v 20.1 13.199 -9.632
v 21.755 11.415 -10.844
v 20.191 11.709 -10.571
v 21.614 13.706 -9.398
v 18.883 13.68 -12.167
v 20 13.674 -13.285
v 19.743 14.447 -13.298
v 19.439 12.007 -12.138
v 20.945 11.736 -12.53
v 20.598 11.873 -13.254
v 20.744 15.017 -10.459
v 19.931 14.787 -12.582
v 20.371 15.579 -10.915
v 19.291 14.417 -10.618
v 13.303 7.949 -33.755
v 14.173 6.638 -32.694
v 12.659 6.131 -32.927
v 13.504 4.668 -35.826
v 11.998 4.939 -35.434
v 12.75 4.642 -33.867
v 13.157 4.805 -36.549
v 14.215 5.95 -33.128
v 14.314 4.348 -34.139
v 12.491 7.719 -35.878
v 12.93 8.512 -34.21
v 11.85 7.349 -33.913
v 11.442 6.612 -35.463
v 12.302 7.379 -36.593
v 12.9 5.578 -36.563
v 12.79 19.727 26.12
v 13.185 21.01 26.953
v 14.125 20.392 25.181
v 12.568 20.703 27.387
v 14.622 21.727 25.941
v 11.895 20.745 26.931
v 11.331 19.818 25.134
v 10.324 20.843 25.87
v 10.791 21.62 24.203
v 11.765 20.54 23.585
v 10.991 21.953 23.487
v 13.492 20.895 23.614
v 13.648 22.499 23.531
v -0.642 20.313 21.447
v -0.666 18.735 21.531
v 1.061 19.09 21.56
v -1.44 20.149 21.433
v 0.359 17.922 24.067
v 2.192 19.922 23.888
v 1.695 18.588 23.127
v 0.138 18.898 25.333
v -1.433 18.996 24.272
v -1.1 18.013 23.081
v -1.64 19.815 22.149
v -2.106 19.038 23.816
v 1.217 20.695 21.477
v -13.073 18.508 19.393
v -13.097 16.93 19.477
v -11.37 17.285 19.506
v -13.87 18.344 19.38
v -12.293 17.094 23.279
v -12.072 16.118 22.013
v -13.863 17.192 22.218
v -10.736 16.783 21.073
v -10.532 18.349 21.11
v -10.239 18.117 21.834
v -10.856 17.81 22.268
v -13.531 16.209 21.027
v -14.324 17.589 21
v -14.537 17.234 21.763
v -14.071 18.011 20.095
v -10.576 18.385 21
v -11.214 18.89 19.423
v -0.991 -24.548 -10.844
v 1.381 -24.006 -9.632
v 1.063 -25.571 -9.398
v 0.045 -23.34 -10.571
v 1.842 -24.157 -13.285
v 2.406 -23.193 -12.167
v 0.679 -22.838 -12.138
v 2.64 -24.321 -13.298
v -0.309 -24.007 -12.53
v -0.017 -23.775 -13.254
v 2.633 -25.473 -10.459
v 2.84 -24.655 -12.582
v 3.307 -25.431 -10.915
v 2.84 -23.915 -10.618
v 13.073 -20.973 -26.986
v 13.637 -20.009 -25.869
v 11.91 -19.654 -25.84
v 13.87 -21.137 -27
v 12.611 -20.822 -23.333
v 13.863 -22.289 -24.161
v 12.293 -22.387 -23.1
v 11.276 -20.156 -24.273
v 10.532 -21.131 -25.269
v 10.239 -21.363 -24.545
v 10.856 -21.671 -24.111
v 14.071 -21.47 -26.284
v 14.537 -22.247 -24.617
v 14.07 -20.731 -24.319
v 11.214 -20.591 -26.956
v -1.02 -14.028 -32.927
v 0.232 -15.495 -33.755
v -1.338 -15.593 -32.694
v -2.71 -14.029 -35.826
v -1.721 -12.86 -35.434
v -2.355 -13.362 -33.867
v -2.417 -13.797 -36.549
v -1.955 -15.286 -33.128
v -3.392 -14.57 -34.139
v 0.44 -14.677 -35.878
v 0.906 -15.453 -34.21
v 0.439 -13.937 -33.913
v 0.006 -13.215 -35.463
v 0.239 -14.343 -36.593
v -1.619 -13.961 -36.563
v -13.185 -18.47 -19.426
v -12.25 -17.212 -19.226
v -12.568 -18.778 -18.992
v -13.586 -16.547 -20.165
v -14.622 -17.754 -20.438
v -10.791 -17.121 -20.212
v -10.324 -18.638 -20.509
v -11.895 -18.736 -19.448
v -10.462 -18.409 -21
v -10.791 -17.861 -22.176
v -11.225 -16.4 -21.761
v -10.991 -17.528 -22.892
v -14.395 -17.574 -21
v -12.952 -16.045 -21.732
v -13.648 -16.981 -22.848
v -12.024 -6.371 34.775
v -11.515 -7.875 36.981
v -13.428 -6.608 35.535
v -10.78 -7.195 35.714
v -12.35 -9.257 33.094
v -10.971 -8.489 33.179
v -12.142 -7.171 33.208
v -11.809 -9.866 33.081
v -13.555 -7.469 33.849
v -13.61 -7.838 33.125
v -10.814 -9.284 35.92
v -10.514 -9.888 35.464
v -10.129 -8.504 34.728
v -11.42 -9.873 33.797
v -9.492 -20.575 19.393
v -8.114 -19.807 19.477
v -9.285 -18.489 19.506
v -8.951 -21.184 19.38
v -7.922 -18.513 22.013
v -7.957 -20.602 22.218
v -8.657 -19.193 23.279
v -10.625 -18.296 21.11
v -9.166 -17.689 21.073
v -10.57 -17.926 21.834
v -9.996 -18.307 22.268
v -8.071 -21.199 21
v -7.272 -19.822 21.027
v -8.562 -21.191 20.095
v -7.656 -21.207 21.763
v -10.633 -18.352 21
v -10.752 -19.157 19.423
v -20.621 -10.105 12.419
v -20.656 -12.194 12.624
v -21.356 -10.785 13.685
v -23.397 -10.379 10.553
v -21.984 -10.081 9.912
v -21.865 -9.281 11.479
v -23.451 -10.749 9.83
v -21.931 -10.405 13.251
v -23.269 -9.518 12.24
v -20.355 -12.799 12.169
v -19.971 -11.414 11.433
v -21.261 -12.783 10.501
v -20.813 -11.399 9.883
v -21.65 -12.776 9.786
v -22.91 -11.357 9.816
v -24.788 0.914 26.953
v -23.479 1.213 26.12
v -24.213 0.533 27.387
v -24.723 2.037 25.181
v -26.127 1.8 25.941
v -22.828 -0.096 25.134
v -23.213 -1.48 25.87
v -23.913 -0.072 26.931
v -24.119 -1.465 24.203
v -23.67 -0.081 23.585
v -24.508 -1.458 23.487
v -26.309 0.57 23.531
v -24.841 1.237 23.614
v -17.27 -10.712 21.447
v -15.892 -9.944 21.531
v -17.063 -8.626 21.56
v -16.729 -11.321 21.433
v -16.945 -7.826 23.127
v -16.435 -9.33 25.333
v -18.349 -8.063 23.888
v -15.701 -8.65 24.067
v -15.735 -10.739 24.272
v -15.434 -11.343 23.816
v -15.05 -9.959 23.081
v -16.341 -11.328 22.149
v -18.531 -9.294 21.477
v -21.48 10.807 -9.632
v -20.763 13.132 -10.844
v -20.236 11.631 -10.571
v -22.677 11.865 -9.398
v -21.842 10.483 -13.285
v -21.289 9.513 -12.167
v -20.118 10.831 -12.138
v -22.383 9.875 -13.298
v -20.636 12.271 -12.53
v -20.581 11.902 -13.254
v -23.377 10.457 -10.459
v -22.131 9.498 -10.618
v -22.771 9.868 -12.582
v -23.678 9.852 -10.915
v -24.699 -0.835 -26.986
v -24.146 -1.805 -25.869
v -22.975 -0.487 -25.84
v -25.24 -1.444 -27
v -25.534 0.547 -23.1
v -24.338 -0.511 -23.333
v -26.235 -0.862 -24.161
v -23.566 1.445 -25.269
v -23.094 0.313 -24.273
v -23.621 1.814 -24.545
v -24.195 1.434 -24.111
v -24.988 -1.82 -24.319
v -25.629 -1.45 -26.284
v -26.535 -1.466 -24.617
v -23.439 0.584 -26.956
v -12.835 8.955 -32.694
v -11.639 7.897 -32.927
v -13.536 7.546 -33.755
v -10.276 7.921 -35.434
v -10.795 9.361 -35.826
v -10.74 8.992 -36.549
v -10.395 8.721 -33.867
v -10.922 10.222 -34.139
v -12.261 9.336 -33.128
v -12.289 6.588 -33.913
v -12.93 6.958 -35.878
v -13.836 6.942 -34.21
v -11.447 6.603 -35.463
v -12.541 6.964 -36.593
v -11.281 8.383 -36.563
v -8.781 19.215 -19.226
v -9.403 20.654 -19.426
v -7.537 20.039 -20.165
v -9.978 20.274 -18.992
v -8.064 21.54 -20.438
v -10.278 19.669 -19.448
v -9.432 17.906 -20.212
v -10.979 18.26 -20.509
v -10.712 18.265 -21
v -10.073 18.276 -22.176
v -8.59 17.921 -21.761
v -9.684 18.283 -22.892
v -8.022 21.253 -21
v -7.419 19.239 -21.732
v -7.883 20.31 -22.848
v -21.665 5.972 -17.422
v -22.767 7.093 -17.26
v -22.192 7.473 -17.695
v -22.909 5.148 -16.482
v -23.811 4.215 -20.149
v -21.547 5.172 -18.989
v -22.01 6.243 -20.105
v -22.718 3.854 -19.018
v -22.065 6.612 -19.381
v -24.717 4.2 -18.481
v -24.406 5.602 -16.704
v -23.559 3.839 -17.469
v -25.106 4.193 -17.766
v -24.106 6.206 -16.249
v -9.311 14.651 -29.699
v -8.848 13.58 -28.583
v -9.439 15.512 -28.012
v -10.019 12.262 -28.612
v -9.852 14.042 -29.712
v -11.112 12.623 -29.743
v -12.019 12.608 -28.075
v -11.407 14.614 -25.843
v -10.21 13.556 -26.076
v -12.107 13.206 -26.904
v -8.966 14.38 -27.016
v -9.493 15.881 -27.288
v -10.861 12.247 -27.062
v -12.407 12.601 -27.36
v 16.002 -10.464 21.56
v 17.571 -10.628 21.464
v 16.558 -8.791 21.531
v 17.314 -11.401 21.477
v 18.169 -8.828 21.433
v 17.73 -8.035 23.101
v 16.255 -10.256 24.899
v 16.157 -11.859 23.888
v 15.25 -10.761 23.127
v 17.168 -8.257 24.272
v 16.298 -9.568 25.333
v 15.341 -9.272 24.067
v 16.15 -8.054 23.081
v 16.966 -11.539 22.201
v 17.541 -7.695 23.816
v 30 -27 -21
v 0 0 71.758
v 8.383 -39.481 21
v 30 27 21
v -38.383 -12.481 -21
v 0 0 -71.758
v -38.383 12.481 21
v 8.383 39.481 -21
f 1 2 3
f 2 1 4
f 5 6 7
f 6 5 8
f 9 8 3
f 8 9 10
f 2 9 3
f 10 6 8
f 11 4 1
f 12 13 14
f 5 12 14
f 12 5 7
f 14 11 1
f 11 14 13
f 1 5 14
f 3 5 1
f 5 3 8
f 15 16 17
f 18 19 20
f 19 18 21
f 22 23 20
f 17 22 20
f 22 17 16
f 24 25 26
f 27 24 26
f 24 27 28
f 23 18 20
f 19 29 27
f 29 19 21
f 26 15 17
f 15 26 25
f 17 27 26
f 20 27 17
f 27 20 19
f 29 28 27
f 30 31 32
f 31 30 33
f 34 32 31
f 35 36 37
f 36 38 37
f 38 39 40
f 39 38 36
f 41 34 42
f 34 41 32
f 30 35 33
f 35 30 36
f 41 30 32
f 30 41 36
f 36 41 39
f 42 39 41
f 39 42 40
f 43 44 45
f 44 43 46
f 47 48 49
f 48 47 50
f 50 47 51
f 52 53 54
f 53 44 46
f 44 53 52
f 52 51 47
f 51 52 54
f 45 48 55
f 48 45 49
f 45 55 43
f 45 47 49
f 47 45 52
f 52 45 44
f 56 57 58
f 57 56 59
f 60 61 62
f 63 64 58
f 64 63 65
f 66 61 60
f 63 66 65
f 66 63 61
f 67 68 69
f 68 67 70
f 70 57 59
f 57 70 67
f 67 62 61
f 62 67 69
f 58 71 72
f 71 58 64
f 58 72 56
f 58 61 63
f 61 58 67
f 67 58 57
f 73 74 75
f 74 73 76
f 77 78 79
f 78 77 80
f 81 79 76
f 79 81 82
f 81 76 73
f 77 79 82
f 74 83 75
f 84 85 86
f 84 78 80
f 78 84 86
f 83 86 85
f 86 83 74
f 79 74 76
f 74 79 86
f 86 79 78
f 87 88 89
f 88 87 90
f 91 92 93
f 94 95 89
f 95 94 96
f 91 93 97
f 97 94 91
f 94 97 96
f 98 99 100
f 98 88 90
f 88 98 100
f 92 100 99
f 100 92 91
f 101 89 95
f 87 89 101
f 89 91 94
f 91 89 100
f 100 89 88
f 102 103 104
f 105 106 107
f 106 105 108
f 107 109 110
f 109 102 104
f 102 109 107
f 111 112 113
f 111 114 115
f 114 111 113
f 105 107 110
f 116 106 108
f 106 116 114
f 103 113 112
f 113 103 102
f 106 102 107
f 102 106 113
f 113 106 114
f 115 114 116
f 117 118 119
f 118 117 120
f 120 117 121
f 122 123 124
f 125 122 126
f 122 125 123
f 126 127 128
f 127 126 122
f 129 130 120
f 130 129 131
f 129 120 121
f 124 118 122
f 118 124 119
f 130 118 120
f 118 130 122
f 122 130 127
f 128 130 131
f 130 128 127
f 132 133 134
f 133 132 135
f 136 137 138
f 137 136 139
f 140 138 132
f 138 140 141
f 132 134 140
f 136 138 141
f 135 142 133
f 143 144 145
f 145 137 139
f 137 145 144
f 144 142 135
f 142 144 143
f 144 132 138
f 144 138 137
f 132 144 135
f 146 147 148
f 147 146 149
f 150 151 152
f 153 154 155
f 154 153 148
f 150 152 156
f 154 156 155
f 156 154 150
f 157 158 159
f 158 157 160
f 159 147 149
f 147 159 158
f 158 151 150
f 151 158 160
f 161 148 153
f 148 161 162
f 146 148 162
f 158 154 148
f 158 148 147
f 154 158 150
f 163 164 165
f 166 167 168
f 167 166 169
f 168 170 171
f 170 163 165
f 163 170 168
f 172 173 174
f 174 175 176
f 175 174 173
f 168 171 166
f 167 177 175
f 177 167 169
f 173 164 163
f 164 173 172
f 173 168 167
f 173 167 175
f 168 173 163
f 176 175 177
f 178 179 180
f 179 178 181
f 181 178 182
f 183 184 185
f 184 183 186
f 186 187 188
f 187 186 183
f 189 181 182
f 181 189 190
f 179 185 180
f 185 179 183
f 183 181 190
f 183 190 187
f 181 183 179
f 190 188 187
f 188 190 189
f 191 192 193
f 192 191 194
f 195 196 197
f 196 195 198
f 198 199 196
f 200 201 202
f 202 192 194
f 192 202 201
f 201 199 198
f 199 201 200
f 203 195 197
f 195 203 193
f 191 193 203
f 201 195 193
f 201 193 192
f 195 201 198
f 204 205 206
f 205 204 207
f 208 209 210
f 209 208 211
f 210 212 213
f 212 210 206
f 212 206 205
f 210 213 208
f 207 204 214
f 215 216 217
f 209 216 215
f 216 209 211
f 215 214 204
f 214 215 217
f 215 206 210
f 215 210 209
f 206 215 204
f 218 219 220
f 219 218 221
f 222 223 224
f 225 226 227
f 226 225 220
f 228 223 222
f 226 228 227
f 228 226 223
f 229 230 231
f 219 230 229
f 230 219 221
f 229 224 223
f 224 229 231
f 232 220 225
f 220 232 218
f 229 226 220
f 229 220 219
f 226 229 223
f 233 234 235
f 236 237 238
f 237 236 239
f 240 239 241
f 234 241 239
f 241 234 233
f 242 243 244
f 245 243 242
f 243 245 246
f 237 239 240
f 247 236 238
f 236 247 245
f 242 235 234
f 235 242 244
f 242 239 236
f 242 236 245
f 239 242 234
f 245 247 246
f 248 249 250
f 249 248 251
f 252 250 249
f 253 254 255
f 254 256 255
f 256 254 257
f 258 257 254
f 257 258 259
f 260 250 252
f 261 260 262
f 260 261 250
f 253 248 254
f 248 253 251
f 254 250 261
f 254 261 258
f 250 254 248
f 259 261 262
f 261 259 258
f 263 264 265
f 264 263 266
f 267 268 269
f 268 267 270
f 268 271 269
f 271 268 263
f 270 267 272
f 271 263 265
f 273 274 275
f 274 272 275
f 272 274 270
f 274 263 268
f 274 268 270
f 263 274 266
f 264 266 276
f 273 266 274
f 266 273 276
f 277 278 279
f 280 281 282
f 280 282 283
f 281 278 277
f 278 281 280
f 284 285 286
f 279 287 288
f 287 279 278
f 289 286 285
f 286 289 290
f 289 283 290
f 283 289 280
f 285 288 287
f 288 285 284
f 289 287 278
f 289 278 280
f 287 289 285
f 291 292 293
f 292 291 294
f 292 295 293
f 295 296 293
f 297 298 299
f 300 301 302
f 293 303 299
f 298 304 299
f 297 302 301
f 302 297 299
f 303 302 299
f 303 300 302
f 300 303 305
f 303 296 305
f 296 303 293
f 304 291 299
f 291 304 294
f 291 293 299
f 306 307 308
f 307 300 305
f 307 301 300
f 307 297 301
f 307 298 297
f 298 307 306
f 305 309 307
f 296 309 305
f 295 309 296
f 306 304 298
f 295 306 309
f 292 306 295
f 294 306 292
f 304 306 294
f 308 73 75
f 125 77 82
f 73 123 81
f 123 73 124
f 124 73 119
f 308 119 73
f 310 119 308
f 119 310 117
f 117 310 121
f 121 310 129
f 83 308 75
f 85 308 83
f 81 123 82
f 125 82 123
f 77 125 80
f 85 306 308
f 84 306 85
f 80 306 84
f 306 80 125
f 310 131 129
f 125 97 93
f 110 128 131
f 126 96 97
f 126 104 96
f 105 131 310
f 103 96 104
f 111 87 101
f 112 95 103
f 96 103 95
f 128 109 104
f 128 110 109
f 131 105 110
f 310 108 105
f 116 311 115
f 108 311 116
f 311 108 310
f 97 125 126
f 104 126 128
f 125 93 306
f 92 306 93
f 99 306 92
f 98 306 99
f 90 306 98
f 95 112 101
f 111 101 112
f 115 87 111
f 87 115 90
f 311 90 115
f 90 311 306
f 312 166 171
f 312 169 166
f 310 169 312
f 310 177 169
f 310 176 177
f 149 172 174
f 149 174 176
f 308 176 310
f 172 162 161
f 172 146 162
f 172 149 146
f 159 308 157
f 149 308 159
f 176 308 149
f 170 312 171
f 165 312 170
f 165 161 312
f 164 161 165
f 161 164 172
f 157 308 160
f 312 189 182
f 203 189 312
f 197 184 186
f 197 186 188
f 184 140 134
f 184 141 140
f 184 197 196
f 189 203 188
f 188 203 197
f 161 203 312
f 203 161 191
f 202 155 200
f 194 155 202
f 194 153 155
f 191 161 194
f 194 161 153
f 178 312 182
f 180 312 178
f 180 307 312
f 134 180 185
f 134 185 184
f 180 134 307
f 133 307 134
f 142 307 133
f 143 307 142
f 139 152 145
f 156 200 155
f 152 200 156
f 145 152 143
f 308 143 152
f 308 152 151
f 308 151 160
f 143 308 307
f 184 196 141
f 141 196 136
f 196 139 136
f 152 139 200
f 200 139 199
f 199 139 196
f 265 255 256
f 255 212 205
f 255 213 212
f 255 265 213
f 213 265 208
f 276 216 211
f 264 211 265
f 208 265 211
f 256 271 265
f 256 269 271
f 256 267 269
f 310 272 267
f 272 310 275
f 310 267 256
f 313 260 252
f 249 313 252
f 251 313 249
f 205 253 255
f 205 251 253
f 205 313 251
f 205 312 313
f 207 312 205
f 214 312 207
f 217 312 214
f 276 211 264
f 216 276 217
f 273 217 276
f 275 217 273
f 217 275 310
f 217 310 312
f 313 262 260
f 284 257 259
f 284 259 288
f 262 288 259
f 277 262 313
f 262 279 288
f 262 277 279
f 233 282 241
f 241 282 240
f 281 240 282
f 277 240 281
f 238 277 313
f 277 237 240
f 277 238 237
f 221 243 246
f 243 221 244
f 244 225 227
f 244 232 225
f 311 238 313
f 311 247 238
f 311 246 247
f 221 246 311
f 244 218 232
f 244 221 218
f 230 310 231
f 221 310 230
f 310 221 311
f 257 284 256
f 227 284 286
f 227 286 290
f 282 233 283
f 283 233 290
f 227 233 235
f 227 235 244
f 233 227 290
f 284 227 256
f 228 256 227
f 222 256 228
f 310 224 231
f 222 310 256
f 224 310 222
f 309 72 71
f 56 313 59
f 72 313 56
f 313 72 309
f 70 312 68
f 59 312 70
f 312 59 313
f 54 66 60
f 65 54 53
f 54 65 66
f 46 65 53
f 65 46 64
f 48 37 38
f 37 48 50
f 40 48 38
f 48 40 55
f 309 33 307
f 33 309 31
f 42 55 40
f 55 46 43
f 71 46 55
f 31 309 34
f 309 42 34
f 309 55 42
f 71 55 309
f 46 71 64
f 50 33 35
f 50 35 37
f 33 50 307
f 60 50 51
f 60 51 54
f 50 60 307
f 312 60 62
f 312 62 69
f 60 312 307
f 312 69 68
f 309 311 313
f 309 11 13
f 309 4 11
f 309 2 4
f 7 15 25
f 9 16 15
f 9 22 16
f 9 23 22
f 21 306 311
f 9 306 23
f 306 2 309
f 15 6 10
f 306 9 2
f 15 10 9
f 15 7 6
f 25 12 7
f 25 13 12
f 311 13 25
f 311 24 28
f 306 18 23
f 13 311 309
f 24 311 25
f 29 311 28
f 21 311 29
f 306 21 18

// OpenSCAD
/* parametric asymmetric trigonal trapezohdron
   geometry from Matlab code by https://twitter.com/etzpcm
   Paul Matthews , Nottingham Uni 
     
*/

// Initial point
//x0
x0 = 1;
//y0
y0 = 0.9;
//z0
z0 = 0.7;
//scale 
scale=30;
// pip size
pip_size=3;
//pip spacing
pip_spacing=9;
//pip resolution 
pip_resolution=5;
//pip alignment - angle of alignment within face 
pip_alignment=35;
//corner radius
radius =0;
// corner resolution
corner_resolution = 5;

function end() = "end";

m1= [[1,0,0], [0,-1,0], [0,0,-1]];   // 180 rotation about x axis
t=2*180/3;
c=cos(t);
s=sin(t);
m2= [ [c,s,0], [-s,c,0], [0,0,1]];   // 120 rotation about z axis

p0= [x0,y0,z0];  
//Ensure 4 face points are coplanar 
z = z0*(-s*x0+(c-1)*y0)*x0/((c-1)*x0+s*y0)/y0;

p1= m2 * p0;
p2= m2 * p1;
p3= m1 * p0;
p4= m2 * p3;
p5= m2 * p4;
p6 = [0,0,z];
p7 = [0,0,-z];
unit_vertices = [p0,p1,p2,p3,p4,p5,p6,p7];
vertices = [for (v=unit_vertices) v* scale];

// faces 2 and 3 reversed to get all faces with the same orientation
// faces reordered so face[i] has i+1 pips

faces = [[0,3,1,6], 
         [5,7,3,0],  
         [2,5,0,6],  
         [1,3,7,4], 
         [4,2,6,1], 
         [4,7,5,2], 
        ];

pips = [  
         [[0,0]],
         [[-1,1],[1,-1]],
         [[-1,-1],[0,0],[1,1]],
         [[-1,1],[1,1],[1,-1],[-1,-1]],
         [[-1,1],[1,1],[1,-1],[-1,-1],[0,0]],
         [[-1,1],[1,1],[1,-1],[-1,-1],[0,1],[0,-1]]
       ];
       
dice(vertices,faces,radius,pip_size,pip_spacing,pip_alignment) ;


module dice(vertices,faces,radius,size,spacing,alignment) {
/*
    base = [for (v = faces[1]) vertices[v]];
    base_centre = centroid(base);
    base_normal = normal(base);
    echo(base,base_centre,base_normal);
    orient_to( [0,0,0], base_normal)
*/
      difference() {
       if(radius==0)
           polyhedron(vertices,faces);
       else hull() 
             for (v = vertices) translate(v) sphere(radius,$fn=corner_resolution);

       for (i =[0:len(faces)-1])  {
           face=faces[i];
           facep = [for (p = face) vertices[p]];
           center=centroid(facep);
           normal=normal(facep);
           orient_to(center,normal) 
               for(place = pips[i]) 
                   rotate([0,0,alignment])
                    translate([place[0]*spacing,place[1]*spacing,radius+2*size/5])
                    sphere(size,$fn=pip_resolution);
       }
     }
 }
function centroid(points) = 
      vsum(points) / len(points);

function vsum(points,i=0) =  
      i < len(points)
        ?  (points[i] + vsum(points,i+1))
        :  [0,0,0];

function orthogonal(v0,v1,v2) =  cross(v1-v0,v2-v1);

function normal(face) =
     let (n=orthogonal(face[0],face[1],face[2]))
     - n / norm(n);
            
module orient_to(centre, normal) {   
      translate(centre)
      rotate([0, 0, atan2(normal.y, normal.x)]) //rotation
      rotate([0, atan2(sqrt(pow(normal.x, 2)+pow(normal.y, 2)),normal.z), 0])
      children();
}

module orient_from(centre, normal) {   
      rotate([0, atan2(sqrt(pow(normal.x, 2)+pow(normal.y, 2)),normal.z), 0])
      rotate([0, 0, atan2(normal.y, normal.x)]) //rotation
      translate(centre)
      children();
}
